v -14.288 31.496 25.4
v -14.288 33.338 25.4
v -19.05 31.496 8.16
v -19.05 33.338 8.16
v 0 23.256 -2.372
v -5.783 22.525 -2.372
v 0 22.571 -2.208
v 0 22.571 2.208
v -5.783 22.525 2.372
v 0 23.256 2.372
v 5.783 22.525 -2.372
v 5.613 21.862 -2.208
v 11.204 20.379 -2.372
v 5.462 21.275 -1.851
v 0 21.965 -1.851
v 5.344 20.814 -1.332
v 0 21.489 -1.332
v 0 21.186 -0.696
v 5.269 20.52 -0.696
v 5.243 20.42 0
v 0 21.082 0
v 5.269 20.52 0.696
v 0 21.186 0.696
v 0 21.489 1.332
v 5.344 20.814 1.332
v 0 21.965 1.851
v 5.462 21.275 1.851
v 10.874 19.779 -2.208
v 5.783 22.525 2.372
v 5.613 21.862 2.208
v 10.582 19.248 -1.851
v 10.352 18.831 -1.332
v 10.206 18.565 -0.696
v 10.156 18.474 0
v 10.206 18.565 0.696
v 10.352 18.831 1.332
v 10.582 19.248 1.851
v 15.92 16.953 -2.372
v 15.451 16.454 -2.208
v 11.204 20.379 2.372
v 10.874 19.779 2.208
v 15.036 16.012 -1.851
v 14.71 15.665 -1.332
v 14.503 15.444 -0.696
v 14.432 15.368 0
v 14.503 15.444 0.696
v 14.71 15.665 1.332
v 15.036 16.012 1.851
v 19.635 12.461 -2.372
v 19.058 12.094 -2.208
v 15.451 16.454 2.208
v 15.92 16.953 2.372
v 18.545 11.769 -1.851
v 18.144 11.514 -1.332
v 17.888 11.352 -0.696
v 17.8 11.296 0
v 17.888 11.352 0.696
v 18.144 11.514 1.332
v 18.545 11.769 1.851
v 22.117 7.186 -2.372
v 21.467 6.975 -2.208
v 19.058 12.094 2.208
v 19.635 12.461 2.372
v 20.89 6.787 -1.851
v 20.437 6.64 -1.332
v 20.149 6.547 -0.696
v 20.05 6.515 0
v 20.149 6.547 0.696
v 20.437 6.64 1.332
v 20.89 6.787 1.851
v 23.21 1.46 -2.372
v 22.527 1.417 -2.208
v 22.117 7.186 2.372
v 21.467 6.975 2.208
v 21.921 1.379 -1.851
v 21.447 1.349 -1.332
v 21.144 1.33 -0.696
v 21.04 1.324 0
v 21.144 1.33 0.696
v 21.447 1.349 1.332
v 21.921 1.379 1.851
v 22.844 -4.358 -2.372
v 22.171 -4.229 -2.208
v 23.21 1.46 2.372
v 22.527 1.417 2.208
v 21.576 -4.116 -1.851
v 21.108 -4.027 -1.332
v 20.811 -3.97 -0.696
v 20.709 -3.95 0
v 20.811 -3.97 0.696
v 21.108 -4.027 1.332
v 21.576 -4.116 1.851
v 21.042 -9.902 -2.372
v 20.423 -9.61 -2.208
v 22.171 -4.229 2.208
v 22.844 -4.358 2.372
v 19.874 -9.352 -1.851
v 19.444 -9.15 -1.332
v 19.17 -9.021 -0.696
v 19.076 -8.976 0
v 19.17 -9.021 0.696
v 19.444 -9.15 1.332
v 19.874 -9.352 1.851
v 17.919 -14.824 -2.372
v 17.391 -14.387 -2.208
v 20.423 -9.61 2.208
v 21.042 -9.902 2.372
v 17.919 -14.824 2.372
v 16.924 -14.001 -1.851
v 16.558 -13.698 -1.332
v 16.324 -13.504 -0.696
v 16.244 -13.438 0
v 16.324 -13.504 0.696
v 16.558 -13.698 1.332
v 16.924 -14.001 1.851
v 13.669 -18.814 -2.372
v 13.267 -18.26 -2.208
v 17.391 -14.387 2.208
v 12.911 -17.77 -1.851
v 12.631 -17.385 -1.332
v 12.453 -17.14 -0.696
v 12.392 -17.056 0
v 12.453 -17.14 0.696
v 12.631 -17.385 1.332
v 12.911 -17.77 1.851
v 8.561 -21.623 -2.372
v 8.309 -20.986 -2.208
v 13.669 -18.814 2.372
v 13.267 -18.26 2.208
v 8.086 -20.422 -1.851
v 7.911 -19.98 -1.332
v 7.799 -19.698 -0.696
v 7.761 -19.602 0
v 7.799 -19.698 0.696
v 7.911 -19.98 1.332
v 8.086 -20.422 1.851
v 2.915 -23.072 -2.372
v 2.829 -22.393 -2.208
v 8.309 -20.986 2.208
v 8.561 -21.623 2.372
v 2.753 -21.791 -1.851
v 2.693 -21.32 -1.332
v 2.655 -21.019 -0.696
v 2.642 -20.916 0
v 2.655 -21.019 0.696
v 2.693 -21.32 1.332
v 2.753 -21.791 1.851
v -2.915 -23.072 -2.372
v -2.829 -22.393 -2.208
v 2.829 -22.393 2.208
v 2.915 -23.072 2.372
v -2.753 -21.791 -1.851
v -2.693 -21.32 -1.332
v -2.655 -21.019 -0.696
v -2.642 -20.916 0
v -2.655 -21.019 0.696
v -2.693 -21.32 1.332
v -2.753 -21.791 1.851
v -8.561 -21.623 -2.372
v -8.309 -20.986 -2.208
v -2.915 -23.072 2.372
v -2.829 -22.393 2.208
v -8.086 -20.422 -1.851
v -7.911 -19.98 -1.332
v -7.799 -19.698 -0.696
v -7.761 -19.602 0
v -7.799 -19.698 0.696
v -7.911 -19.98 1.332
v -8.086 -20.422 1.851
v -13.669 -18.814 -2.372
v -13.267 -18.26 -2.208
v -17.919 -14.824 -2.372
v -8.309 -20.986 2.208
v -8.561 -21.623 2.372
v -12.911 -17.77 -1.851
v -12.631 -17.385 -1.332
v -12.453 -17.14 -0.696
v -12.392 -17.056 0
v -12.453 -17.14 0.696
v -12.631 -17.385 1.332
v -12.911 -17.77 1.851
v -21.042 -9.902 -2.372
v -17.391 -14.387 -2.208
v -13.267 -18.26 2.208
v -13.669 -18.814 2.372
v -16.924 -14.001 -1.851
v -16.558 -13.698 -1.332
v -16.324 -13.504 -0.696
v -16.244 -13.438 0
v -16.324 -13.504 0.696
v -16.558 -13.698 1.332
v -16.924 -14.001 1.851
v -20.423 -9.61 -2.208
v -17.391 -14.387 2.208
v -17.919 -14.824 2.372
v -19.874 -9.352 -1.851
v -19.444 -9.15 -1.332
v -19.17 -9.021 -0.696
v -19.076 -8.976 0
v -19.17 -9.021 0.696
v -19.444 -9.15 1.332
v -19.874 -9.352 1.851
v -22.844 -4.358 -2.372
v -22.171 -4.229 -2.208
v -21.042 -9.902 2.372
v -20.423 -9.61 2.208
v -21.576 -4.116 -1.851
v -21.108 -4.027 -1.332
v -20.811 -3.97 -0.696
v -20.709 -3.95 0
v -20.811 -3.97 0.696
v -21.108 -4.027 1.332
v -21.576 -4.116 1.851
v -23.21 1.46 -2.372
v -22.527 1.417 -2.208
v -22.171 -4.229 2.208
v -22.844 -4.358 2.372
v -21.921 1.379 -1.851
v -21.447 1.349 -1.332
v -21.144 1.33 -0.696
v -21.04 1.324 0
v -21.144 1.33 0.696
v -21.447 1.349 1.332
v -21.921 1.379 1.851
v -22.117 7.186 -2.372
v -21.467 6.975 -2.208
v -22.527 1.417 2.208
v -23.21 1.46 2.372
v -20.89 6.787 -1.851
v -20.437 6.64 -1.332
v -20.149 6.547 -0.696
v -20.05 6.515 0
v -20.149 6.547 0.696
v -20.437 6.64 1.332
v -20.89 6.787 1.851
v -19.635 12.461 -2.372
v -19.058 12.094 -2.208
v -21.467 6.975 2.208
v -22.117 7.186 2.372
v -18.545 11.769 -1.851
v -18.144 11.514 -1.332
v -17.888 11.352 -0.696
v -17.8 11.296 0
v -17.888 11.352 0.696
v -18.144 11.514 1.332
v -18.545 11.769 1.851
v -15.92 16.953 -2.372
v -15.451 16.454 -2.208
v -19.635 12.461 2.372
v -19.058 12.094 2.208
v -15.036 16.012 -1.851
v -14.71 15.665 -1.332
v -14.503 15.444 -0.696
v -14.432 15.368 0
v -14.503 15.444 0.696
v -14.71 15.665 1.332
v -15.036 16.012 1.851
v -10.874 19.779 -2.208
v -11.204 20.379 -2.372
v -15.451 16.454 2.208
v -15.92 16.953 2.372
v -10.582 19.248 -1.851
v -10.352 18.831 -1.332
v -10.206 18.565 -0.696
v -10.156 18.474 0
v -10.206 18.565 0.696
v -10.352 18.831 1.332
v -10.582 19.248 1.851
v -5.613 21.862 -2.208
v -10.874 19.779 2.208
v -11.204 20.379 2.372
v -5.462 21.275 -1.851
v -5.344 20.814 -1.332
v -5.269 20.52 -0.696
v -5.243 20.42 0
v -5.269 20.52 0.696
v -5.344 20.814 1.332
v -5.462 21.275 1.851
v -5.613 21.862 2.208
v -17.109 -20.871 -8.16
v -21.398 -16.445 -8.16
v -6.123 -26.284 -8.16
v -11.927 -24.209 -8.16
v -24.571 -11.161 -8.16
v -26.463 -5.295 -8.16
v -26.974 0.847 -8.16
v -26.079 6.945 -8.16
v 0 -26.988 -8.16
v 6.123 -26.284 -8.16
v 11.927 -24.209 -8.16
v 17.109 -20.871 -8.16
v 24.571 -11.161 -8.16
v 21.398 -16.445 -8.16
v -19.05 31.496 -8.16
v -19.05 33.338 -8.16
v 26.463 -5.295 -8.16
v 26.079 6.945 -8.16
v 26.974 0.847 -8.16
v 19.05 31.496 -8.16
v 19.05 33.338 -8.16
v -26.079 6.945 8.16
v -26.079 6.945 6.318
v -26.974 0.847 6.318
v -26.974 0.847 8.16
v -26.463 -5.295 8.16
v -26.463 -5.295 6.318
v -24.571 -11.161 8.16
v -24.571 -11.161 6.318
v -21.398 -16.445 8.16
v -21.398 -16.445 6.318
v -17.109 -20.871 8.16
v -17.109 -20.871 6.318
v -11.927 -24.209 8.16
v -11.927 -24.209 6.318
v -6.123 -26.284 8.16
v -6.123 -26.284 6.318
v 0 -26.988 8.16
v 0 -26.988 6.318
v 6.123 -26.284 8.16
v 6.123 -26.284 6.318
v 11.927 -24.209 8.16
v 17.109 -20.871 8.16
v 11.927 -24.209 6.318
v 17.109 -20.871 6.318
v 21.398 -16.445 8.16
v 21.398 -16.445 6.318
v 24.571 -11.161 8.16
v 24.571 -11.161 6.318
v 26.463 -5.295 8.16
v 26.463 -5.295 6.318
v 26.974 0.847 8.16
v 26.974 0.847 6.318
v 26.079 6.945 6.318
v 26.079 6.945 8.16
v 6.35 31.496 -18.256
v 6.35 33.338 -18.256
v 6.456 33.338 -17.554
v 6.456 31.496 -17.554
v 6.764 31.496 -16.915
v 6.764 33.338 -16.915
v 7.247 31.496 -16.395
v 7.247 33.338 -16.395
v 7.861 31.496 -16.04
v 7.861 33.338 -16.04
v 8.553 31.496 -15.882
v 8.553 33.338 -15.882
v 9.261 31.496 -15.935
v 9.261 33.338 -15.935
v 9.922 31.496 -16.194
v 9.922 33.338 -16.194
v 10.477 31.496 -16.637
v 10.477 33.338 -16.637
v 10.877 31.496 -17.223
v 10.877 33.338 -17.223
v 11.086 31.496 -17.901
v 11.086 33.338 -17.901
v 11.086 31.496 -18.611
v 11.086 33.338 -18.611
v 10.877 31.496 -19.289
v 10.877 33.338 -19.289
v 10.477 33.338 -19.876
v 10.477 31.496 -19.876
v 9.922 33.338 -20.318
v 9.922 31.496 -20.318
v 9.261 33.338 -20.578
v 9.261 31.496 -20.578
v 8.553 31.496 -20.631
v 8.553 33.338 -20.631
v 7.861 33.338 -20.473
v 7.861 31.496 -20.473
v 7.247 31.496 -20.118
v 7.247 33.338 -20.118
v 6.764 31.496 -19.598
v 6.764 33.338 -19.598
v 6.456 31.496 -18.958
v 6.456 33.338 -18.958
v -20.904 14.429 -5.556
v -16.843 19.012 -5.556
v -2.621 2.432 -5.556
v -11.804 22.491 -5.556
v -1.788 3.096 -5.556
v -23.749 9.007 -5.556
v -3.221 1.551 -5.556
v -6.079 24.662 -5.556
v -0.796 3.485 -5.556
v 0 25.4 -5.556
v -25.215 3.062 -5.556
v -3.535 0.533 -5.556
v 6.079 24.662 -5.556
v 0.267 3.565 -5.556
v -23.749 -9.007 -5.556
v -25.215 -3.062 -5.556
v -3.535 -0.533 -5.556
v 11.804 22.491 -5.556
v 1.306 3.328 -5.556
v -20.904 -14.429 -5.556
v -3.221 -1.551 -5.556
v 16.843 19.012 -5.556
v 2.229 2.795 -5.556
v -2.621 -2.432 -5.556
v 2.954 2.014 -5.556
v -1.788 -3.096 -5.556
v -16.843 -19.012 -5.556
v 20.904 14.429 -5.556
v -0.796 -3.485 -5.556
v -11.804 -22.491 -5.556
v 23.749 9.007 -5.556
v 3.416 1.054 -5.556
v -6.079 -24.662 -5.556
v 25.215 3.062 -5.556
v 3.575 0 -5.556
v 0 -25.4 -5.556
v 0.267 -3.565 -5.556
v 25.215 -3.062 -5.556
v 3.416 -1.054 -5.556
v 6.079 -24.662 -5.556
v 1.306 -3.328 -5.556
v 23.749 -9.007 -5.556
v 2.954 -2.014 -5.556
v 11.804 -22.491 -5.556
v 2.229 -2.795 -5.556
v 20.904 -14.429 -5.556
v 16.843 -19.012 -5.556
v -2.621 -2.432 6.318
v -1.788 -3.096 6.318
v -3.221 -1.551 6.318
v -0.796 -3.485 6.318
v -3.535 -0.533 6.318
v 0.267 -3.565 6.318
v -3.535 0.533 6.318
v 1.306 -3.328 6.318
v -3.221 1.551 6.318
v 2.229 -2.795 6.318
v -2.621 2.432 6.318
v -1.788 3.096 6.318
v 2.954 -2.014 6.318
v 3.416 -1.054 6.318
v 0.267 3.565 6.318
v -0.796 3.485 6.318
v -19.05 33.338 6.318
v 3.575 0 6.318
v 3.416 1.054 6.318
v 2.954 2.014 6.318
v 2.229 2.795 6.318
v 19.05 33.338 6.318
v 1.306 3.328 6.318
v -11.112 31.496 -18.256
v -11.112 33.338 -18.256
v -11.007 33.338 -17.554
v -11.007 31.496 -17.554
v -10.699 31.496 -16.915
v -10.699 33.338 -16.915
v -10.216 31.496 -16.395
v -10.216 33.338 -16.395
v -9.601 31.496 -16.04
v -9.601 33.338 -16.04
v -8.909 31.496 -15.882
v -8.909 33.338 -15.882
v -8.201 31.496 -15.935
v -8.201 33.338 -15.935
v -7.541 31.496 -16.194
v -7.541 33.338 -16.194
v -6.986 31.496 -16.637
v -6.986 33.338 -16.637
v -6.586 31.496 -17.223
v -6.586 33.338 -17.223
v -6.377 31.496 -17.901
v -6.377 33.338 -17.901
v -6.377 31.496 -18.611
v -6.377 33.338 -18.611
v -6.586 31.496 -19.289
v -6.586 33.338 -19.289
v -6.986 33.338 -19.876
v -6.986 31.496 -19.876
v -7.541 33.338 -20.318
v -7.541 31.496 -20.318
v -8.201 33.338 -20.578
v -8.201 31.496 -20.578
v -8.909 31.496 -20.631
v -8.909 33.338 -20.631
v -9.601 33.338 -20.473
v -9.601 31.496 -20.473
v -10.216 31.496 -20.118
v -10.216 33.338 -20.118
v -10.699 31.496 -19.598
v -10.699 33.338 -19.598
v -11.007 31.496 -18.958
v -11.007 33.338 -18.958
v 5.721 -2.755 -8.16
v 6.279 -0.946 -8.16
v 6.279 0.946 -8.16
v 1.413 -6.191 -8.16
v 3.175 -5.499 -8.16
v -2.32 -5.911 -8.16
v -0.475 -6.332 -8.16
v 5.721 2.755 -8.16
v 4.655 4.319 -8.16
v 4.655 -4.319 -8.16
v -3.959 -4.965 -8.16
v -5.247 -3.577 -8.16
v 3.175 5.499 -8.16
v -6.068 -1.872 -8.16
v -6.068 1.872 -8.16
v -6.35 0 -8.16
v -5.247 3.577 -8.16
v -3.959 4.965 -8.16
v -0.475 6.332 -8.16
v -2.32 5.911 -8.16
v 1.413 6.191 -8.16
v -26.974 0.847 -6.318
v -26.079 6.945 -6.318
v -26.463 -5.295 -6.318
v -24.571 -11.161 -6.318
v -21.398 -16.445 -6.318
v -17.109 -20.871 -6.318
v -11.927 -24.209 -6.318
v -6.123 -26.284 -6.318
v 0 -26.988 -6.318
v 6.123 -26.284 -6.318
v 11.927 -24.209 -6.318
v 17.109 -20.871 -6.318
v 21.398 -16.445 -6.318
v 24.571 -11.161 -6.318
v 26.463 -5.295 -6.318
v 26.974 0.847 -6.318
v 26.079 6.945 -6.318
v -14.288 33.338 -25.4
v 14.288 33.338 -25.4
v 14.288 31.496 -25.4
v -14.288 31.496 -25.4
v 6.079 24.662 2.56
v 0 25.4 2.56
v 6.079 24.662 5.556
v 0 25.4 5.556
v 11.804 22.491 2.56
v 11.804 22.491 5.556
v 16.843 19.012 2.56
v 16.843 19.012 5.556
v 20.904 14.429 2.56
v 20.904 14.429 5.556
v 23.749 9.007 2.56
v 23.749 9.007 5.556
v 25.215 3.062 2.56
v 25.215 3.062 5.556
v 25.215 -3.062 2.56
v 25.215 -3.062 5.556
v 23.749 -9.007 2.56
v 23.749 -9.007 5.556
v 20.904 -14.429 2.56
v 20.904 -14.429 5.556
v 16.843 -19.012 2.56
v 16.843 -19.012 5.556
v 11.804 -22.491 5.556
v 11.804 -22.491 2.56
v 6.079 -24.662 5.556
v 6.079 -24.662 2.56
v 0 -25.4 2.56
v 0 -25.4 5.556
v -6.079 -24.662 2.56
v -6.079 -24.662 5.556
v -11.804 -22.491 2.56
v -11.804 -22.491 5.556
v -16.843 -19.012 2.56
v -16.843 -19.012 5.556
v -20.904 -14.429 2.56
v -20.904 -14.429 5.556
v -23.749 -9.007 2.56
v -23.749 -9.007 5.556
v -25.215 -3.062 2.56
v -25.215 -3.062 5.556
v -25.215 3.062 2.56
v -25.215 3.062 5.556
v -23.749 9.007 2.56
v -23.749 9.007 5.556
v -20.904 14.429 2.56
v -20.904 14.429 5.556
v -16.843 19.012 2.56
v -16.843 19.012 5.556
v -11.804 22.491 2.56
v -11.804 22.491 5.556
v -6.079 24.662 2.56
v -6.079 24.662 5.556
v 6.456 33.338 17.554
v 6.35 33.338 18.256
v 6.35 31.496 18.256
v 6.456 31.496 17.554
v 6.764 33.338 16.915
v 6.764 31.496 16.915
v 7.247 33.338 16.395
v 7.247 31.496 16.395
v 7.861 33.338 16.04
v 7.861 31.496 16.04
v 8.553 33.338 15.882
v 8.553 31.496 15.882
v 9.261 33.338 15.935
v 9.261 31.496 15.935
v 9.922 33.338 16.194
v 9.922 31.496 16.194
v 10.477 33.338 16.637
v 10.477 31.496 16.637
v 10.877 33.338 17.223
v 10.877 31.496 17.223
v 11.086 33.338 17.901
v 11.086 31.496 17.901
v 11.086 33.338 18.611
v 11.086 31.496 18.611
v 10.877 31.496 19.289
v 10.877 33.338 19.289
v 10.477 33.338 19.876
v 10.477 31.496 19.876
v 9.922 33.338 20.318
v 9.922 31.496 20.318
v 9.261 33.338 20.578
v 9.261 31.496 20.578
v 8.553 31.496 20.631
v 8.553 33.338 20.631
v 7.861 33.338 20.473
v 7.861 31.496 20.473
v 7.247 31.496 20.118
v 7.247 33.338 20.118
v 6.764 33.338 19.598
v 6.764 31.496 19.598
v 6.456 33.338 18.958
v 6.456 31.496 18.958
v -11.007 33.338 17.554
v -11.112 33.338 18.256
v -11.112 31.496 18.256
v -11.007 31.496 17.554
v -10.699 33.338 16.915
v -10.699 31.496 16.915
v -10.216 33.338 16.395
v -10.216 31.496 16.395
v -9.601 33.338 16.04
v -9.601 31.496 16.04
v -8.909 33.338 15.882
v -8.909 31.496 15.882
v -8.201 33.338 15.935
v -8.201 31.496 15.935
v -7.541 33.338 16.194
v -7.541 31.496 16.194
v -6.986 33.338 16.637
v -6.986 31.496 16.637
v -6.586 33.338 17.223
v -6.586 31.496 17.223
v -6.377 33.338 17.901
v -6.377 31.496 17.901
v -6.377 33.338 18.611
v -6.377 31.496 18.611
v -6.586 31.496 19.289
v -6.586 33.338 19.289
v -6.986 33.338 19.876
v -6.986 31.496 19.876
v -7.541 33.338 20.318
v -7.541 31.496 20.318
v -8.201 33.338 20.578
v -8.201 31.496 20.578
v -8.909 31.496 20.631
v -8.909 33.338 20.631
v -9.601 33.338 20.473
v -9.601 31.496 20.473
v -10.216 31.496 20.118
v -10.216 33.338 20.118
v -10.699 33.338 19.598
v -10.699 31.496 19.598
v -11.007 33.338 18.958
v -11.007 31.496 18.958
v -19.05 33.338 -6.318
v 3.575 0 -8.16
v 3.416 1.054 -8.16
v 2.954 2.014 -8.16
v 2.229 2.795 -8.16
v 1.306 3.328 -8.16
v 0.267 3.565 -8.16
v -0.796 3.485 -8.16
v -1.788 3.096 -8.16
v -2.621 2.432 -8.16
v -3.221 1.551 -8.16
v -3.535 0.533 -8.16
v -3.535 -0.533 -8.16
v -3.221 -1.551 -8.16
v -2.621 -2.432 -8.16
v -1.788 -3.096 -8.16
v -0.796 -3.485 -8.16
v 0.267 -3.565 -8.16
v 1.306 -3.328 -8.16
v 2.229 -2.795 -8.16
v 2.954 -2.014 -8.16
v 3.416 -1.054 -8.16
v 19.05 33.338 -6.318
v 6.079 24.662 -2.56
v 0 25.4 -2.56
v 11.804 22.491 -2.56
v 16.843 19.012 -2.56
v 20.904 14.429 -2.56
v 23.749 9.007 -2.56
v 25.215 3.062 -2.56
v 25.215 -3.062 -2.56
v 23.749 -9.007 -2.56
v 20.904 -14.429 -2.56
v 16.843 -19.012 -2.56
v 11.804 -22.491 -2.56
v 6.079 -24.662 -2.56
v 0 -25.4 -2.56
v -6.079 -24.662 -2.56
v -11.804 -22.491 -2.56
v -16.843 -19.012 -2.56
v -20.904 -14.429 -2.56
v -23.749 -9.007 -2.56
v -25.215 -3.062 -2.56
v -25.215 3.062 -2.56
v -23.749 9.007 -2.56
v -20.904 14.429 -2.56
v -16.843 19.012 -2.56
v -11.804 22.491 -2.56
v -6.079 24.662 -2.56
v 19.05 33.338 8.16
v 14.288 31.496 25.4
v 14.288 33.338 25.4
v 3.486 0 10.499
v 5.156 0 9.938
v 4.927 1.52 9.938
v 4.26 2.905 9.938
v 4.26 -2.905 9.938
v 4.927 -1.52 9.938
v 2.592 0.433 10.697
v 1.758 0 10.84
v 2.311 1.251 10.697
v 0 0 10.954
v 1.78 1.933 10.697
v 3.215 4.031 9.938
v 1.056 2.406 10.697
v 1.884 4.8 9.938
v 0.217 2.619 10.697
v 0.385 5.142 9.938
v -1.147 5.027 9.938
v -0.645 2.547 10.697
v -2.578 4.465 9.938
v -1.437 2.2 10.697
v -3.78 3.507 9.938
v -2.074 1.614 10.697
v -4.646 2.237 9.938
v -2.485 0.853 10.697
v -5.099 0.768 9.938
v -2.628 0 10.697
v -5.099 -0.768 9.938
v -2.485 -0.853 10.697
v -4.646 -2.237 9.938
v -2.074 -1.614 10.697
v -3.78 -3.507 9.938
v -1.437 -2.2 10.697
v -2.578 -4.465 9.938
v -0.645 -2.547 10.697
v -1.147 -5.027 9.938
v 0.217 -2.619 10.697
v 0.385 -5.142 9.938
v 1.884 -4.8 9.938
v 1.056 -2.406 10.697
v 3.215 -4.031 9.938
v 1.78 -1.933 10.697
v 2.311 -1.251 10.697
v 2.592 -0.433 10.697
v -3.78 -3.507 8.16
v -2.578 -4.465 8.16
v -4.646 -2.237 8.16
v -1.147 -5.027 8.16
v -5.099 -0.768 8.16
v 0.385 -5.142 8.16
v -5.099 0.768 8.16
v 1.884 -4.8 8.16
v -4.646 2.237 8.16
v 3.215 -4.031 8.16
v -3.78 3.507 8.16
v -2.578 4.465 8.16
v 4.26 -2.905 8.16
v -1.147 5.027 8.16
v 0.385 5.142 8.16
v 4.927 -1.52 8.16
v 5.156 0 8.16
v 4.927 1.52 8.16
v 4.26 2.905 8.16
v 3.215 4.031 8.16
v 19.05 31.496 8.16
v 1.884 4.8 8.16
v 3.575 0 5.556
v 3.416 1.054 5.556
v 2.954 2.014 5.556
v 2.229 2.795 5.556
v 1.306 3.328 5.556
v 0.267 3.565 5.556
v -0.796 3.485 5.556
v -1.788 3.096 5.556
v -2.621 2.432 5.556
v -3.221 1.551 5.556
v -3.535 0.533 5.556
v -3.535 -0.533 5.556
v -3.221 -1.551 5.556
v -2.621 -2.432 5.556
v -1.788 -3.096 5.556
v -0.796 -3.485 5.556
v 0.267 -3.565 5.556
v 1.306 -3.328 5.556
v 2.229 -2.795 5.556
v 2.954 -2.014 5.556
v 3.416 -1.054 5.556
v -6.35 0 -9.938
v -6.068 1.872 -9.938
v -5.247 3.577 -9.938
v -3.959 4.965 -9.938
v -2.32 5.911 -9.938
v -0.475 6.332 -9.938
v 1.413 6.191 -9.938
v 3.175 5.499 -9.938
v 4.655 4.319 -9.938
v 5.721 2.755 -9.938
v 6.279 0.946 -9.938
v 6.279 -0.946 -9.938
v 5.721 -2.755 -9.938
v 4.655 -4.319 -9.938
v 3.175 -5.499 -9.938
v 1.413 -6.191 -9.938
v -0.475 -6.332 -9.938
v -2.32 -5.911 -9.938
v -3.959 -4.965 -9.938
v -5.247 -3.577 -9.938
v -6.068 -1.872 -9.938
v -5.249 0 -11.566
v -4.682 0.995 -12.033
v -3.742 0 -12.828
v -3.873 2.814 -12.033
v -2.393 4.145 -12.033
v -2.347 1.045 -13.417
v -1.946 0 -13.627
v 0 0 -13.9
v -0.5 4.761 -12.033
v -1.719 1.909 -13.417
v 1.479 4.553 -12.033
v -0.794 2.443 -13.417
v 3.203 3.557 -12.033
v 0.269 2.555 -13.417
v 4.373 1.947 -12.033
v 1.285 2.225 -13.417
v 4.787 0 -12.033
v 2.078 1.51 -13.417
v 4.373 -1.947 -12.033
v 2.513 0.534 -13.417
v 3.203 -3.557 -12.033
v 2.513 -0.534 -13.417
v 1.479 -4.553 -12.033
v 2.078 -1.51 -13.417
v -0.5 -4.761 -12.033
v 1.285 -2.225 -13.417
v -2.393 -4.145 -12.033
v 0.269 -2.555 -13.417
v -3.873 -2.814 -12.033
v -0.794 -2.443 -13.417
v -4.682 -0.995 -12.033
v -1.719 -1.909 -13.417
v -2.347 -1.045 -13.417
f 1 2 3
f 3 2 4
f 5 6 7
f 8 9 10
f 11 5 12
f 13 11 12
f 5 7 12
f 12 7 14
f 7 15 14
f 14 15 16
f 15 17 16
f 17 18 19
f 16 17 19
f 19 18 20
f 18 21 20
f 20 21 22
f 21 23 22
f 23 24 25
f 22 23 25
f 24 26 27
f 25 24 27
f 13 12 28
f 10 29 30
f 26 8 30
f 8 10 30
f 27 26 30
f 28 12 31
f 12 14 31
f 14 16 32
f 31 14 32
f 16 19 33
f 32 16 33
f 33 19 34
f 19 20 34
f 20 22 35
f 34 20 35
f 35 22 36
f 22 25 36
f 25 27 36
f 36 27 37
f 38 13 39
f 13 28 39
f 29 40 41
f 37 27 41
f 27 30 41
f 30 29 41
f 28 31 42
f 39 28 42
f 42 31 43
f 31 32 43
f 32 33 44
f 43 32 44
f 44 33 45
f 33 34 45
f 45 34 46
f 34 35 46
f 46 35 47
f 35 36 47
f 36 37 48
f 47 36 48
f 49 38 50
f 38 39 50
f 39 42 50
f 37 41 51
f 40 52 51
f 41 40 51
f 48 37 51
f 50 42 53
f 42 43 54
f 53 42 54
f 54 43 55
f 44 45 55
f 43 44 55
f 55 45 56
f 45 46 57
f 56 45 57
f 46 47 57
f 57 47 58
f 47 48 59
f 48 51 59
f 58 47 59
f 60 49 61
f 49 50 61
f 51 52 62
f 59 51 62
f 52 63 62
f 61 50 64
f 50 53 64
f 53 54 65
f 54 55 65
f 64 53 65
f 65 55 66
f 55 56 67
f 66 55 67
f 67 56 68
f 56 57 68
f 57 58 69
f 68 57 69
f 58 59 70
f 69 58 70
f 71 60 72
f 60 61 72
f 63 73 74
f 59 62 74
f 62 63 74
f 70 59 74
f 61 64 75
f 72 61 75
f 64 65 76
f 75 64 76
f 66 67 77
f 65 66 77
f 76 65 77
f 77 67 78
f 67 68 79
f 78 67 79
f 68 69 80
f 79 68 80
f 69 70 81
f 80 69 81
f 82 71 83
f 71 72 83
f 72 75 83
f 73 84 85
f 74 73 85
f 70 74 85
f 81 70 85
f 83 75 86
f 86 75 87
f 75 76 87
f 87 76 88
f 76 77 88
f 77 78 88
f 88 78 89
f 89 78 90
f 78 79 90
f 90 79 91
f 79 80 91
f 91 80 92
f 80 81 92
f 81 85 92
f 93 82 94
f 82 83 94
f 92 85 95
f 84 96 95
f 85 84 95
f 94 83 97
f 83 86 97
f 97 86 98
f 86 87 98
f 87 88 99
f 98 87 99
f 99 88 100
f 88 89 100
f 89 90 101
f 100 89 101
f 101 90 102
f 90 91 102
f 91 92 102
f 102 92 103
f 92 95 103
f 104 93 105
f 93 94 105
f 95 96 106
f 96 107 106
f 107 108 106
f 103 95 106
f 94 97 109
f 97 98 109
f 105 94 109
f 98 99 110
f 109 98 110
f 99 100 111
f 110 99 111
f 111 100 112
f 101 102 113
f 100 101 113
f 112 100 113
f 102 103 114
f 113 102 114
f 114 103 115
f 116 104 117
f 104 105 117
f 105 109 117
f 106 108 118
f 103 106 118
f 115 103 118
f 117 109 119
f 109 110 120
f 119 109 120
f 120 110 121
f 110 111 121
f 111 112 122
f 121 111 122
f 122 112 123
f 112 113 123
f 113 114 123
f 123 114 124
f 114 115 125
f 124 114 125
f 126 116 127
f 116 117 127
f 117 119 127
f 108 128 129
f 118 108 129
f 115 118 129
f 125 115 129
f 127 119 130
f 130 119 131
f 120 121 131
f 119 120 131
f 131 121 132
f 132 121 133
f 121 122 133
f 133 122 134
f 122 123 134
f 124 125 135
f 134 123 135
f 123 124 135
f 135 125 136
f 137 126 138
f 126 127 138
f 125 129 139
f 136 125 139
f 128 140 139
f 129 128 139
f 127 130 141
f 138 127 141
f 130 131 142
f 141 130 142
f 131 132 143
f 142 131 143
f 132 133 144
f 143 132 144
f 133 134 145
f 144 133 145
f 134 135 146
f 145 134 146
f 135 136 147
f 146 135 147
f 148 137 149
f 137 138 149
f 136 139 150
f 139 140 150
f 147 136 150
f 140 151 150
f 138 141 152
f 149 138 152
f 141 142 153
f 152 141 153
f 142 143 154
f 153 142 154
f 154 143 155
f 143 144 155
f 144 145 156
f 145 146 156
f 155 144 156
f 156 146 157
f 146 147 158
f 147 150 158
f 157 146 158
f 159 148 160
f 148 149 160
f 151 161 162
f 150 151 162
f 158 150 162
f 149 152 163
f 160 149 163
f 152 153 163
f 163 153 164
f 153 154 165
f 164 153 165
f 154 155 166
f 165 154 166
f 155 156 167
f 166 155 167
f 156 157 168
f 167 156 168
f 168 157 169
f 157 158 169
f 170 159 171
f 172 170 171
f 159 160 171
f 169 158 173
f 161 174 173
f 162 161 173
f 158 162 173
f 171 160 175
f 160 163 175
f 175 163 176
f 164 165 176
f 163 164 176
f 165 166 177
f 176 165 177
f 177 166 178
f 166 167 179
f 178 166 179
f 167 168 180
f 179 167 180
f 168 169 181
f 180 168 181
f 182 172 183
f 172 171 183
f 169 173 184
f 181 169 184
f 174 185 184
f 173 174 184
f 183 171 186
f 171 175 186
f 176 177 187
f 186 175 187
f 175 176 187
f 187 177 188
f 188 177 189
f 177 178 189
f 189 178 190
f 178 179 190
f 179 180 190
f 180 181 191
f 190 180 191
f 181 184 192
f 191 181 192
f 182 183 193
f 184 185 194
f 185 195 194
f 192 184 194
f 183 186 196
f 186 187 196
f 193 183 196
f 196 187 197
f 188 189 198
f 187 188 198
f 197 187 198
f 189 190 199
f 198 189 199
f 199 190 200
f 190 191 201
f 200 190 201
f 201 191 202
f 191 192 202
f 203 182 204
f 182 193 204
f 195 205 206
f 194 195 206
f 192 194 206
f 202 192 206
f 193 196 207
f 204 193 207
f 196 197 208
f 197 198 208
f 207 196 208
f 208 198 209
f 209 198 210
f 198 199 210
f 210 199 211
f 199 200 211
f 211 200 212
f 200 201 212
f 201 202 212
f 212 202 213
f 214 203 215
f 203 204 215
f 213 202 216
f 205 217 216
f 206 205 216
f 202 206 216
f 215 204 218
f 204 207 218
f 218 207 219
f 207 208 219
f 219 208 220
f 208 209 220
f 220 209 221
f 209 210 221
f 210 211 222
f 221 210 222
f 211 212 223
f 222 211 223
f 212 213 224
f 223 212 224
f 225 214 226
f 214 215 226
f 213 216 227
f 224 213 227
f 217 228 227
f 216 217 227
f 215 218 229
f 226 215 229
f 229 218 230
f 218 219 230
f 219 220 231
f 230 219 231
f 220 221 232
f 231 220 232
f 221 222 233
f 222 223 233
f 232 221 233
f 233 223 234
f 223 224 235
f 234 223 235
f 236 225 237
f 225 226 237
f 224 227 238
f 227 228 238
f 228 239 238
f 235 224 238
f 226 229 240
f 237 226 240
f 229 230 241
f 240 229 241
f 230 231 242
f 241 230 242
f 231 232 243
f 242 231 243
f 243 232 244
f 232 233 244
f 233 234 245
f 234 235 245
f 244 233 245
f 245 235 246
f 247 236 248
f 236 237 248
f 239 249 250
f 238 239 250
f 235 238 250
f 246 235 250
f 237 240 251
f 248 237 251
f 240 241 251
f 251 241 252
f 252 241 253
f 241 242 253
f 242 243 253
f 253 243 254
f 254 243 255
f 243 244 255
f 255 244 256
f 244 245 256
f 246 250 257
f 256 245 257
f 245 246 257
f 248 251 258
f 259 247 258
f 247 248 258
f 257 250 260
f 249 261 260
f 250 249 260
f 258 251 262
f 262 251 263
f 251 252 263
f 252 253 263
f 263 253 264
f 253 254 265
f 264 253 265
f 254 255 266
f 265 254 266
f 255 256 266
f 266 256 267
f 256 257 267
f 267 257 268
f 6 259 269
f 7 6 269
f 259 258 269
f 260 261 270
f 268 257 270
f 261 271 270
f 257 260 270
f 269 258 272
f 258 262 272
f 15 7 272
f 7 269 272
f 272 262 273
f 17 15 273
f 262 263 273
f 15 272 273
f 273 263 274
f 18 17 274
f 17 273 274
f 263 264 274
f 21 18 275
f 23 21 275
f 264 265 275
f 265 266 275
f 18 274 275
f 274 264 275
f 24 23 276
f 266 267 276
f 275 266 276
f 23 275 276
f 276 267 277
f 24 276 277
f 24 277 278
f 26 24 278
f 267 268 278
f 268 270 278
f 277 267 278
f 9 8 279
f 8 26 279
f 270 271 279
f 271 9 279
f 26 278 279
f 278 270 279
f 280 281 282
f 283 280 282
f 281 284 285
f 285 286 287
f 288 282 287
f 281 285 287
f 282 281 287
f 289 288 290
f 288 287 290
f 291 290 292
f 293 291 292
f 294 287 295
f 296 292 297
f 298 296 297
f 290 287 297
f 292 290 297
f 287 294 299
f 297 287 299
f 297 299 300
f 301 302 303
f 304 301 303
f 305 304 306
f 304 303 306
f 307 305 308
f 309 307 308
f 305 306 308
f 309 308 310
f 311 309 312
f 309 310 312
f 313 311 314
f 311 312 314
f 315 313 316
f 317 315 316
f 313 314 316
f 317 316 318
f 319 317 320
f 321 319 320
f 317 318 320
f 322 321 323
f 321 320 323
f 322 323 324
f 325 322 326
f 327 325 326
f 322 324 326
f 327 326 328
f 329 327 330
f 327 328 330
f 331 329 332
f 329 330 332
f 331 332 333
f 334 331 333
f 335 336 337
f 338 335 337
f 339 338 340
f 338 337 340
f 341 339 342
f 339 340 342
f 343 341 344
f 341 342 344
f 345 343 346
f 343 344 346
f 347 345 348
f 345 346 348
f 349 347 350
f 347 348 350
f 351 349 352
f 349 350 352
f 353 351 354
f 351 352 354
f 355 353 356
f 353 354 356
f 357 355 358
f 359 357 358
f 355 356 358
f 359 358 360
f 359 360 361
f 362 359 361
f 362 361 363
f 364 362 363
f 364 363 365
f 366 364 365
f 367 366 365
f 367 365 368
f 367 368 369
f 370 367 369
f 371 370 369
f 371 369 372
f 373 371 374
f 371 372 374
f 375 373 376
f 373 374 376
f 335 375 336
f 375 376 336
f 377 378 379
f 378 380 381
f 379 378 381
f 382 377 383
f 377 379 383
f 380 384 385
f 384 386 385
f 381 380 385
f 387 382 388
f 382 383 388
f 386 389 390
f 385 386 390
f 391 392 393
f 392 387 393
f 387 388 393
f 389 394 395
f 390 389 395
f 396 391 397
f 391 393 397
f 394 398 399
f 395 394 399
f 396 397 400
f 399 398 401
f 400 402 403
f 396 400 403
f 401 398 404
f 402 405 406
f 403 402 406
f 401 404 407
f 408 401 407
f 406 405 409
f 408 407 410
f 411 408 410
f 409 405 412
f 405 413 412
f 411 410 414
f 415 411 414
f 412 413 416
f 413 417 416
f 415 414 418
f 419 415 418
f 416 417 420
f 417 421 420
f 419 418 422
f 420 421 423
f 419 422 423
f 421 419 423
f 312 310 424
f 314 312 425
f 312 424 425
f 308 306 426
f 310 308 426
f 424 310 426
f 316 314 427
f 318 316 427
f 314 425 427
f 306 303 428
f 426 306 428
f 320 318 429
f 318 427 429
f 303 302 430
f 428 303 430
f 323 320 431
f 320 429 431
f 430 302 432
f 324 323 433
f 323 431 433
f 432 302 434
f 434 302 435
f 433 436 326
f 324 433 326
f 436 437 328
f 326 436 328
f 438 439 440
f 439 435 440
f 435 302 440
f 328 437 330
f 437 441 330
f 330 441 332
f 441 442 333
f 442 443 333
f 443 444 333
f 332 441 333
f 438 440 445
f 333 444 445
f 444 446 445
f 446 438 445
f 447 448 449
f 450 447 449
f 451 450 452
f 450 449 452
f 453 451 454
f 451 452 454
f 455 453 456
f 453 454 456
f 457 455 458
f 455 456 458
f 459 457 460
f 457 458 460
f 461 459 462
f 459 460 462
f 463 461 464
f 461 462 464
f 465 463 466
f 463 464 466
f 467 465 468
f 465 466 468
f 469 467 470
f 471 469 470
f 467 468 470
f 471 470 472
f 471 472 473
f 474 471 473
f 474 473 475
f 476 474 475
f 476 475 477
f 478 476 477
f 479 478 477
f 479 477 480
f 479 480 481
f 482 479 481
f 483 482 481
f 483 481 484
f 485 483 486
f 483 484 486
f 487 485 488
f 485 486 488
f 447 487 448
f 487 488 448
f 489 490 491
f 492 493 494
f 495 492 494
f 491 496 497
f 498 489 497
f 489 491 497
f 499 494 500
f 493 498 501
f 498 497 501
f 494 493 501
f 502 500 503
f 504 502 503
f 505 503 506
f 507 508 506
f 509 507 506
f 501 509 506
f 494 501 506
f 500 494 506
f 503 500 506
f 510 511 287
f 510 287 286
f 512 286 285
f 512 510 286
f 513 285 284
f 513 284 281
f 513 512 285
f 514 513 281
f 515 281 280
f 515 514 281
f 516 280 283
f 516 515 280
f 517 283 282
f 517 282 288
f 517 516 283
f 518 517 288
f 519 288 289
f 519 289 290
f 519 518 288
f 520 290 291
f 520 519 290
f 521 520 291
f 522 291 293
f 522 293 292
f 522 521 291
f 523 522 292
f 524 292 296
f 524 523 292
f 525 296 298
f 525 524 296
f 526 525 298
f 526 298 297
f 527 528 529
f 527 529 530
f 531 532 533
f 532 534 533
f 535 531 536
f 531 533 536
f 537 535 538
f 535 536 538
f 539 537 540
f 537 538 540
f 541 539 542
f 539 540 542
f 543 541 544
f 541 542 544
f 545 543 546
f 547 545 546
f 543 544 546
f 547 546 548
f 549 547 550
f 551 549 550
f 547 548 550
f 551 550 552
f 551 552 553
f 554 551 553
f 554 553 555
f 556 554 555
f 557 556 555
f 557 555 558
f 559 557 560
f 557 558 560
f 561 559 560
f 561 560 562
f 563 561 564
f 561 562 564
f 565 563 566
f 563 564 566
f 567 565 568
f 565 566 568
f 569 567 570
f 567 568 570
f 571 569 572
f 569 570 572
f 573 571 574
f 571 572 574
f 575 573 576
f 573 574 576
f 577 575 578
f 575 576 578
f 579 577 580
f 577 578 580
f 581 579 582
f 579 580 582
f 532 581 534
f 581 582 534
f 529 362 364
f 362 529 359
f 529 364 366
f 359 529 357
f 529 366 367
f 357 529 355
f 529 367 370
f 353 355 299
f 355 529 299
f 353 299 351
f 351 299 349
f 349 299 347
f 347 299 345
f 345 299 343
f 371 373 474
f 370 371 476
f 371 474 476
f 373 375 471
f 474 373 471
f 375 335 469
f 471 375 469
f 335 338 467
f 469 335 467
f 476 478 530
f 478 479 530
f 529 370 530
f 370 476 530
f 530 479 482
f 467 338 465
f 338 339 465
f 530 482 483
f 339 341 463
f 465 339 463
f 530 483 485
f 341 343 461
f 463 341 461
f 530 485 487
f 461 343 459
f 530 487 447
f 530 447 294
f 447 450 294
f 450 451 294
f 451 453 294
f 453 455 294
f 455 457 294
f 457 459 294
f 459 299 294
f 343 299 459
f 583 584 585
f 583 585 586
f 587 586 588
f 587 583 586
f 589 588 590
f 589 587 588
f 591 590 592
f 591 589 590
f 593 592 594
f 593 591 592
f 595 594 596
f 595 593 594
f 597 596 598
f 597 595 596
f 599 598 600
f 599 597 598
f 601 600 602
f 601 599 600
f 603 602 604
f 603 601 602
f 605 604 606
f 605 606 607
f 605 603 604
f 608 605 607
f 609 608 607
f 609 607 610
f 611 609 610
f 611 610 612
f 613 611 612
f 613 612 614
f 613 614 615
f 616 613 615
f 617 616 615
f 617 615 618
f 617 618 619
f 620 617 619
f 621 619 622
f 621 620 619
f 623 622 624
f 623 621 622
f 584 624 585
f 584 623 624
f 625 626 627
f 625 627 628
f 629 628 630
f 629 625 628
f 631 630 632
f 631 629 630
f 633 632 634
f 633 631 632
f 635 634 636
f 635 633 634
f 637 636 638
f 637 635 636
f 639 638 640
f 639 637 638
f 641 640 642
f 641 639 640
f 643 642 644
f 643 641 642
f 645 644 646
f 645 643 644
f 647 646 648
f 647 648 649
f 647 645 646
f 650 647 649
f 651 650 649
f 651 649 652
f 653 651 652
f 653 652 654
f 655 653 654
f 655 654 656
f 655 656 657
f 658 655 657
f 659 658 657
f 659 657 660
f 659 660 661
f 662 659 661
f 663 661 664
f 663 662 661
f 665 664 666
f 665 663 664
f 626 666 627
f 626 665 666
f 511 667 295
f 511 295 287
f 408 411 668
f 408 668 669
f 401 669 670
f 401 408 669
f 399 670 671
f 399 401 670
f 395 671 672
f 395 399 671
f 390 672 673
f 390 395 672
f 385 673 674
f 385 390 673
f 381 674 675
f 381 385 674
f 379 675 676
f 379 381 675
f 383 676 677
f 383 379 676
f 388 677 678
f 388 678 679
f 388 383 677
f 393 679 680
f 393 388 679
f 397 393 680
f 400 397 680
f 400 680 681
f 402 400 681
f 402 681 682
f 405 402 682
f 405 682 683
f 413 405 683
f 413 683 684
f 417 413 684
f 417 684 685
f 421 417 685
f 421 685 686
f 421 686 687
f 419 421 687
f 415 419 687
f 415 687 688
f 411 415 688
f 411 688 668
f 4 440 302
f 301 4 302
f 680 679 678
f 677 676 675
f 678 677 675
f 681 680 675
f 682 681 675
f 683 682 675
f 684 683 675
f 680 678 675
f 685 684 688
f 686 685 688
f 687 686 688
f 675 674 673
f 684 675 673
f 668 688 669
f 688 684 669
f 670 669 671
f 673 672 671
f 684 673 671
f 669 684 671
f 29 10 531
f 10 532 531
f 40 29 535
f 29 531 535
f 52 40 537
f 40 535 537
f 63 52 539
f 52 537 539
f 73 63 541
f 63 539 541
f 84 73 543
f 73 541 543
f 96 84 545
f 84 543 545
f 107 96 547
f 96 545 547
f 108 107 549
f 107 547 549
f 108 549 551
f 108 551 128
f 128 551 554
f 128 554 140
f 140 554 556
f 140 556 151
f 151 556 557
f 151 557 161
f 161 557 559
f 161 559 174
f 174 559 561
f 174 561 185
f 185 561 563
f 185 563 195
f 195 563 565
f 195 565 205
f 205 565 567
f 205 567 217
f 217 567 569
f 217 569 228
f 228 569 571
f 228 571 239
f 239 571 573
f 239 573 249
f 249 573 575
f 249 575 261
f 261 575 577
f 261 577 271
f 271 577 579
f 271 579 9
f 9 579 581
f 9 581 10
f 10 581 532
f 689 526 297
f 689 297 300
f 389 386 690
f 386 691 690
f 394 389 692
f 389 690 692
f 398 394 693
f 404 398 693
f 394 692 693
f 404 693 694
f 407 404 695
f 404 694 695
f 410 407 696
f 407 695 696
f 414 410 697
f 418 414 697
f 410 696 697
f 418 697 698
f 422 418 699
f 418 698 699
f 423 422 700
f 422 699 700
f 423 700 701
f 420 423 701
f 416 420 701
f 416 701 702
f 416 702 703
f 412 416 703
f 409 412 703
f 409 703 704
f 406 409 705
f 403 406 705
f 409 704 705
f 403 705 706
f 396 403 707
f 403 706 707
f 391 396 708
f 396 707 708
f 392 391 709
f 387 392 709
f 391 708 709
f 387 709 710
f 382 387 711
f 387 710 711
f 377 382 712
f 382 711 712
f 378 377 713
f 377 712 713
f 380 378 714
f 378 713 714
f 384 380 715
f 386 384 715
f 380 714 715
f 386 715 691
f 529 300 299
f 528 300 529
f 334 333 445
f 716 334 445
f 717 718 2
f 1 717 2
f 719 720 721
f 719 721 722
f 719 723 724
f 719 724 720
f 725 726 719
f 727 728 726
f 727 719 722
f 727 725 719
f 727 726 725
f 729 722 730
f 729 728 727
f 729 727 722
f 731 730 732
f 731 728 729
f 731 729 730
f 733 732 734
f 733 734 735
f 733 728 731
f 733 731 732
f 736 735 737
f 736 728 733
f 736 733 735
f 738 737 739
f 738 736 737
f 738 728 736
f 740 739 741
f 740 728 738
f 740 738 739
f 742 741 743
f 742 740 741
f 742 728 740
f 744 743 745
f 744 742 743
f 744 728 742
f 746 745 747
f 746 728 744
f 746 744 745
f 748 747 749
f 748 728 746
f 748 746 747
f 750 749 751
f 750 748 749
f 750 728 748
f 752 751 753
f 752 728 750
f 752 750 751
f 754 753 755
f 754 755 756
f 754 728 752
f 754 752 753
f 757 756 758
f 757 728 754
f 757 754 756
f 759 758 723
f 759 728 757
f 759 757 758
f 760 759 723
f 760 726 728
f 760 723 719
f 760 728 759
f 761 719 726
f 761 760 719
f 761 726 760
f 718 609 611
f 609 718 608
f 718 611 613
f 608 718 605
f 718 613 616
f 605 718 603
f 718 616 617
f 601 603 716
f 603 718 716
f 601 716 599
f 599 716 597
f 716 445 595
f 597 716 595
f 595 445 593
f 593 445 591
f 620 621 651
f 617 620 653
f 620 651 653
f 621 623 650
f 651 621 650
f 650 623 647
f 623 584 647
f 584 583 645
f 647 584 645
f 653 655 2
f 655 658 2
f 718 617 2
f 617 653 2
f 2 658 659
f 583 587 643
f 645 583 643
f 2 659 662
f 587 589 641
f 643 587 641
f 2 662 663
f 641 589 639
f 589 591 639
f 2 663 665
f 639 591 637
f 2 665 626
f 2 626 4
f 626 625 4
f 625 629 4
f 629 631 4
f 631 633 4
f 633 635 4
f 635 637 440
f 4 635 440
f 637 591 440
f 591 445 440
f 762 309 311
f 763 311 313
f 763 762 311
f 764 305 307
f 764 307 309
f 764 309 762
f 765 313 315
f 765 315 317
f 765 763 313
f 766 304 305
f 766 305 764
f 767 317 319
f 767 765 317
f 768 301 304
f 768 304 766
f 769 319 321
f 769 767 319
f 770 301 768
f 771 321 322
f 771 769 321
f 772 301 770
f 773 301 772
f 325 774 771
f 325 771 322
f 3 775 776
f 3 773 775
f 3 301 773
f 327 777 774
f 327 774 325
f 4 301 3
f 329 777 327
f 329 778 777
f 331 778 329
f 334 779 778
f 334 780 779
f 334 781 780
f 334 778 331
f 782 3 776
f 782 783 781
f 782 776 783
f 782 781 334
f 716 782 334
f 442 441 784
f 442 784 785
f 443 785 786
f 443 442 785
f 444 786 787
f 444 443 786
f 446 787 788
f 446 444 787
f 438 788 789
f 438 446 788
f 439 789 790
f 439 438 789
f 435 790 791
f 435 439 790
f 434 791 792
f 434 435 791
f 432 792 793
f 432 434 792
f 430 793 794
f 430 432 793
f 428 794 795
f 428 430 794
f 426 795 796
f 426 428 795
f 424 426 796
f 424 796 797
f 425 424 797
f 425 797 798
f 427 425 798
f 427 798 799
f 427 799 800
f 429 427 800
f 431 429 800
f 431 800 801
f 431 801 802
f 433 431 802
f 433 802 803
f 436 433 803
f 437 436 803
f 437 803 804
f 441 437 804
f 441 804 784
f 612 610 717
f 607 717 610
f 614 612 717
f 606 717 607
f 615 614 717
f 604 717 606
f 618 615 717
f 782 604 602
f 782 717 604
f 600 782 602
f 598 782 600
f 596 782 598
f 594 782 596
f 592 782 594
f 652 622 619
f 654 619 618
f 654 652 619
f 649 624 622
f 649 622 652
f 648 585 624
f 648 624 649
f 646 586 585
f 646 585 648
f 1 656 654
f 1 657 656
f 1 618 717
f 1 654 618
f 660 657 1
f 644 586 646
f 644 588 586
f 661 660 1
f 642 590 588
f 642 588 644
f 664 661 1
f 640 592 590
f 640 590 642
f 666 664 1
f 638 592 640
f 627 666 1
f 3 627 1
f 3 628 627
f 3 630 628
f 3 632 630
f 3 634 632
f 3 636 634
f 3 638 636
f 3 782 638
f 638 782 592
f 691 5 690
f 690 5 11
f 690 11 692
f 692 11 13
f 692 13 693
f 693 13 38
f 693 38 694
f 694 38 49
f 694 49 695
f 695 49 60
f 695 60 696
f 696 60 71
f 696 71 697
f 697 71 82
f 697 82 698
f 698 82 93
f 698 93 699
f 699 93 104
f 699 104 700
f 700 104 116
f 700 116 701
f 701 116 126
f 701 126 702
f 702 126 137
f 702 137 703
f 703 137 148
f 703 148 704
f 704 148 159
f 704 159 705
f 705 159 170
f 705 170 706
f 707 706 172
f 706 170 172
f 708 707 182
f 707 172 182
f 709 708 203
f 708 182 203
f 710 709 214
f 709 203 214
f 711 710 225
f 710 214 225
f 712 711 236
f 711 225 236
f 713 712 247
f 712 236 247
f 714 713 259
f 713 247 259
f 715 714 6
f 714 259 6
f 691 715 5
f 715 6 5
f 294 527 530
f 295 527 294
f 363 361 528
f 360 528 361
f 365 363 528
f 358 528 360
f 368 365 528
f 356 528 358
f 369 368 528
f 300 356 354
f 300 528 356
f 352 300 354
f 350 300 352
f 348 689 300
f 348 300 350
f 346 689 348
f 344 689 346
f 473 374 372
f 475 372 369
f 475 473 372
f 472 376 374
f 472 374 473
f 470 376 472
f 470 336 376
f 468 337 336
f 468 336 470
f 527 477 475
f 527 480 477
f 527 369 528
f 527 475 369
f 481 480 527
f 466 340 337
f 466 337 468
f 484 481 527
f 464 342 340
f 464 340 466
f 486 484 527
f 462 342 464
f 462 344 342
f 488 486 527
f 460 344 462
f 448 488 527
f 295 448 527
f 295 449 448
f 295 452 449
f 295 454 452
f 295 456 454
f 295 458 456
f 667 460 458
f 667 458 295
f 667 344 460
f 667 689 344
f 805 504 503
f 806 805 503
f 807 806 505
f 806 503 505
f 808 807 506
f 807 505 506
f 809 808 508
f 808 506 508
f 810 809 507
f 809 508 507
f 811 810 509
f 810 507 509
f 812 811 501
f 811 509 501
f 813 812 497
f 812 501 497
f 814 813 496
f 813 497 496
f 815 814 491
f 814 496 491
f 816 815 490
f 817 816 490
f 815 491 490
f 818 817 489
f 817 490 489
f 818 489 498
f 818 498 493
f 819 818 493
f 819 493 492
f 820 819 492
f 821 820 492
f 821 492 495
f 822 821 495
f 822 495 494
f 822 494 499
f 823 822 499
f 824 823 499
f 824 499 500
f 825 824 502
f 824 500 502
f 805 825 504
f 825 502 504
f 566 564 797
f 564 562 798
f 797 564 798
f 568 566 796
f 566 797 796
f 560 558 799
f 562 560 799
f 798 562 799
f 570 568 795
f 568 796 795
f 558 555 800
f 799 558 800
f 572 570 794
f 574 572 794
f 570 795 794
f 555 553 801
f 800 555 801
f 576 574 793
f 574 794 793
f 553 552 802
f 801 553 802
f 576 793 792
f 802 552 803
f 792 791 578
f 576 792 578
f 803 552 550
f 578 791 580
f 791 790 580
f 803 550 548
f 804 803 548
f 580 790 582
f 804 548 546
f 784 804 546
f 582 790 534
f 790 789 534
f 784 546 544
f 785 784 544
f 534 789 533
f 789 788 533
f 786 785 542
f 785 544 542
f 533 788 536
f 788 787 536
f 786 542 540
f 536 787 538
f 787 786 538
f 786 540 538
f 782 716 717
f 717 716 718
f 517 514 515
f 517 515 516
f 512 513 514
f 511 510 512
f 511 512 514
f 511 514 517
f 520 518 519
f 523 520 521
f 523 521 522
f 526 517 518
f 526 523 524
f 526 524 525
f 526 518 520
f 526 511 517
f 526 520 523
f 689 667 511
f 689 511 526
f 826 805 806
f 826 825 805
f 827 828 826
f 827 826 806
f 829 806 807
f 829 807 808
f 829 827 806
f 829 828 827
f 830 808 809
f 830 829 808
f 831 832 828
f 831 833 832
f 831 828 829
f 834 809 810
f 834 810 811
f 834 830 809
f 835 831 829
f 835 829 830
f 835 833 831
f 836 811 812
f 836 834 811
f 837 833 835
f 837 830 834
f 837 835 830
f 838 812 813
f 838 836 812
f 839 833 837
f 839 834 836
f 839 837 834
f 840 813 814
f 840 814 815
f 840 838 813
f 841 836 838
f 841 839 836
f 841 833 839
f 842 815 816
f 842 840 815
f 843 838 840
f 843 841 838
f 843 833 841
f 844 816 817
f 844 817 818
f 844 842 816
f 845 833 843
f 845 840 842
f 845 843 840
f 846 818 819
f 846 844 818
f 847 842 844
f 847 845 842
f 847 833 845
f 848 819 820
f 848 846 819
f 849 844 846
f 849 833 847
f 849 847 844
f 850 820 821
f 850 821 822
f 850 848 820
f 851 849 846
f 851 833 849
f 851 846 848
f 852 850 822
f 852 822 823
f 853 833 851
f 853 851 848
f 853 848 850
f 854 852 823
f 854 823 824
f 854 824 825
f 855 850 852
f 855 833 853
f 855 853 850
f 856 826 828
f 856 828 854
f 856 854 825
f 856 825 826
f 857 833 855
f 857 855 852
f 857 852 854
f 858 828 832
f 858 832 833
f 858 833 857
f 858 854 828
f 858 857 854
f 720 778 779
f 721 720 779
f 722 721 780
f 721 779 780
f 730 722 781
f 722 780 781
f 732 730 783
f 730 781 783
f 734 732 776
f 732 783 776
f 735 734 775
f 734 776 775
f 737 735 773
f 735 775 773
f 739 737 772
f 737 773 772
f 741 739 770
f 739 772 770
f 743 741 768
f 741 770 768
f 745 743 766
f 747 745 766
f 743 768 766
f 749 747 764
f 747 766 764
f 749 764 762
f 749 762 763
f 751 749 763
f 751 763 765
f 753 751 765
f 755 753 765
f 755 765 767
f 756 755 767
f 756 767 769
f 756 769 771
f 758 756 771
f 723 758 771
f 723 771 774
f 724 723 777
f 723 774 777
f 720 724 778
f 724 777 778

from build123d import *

# Parameters (mm, degrees)
BOSS_EXTRUDE1_DEPTH = 1.8415
SKETCH5_R           = 2.38125
BOSS_EXTRUDE2_DEPTH = 1.8415
SKETCH6_R           = 5.1562
BOSS_EXTRUDE3_DEPTH = 1.778
DOME4_FACE_RADIUS   = 5.1562
DOME4_HEIGHT        = 1.016
SKETCH8_R           = 6.35
BOSS_EXTRUDE4_DEPTH = 1.778
DOME7_FACE_RADIUS   = 6.35
DOME7_HEIGHT        = 3.9624
SKETCH9_R           = 3.57505
BOSS_EXTRUDE5_DEPTH = 16.3195


with BuildPart() as part:
    # Sketch3 → Revolve1 (revolve)
    with BuildSketch(Plane(origin=(0, 0, 0), x_dir=(0, 0, -1), z_dir=(1, 0, 0))):
        with BuildLine():
            Line((-5.55625, 25.4), (-5.55625, 0))
            Line((-5.55625, 0), (5.55625, 0))
            Line((5.55625, 0), (5.55625, 25.4))
            Line((5.55625, 25.4), (2.559789657, 25.4))
            Line((2.559789657, 25.4), (2.372188625, 23.255710388))
            ThreePointArc((2.372188625, 23.255710388), (0, 21.082), (-2.372188625, 23.255710388))
            Line((-2.372188625, 23.255710388), (-2.559789657, 25.4))
            Line((-2.559789657, 25.4), (-5.55625, 25.4))
        make_face()
    revolve(axis=Axis((0, 0, 5.55625), (0, 0, -1)))



with BuildPart() as body_2:
    # Sketch4 → Boss-Extrude1 (new body)
    with BuildSketch(Plane.XY.offset(6.31825)):
        with BuildLine():
            Line((19.05, 33.3375), (-19.05, 33.3375))
            Line((-19.05, 33.3375), (-26.078582277, 6.944976794))
            ThreePointArc((-26.078582277, 6.944976794), (0, -26.9875), (26.078582277, 6.944976794))
            Line((26.078582277, 6.944976794), (19.05, 33.3375))
        make_face()
    extrude(amount=BOSS_EXTRUDE1_DEPTH)

    # Sketch5 → Boss-Extrude2 (add)
    with BuildSketch(Plane(origin=(0, 33.3375, 97.5995), x_dir=(-1, 0, 0), z_dir=(0, -1, 0))):
        Polygon((-14.2875, 72.1995), (14.2875, 72.1995), (19.05, 89.43975), (-19.05, 89.43975), align=None)
        with Locations((-8.73125, 79.34325)):
            Circle(SKETCH5_R, mode=Mode.SUBTRACT)
        with Locations((8.73125, 79.34325)):
            Circle(SKETCH5_R, mode=Mode.SUBTRACT)
    extrude(amount=BOSS_EXTRUDE2_DEPTH)


with BuildPart() as body_3:
    # Mirror1: mirrored copy
    add(body_2.part.mirror(Plane.XY))


with BuildPart() as body_2_1:
    add(body_2.part)

    # Sketch6 → Boss-Extrude3 (add)
    with BuildSketch(Plane.XY.offset(8.15975)):
        Circle(SKETCH6_R)
    extrude(amount=BOSS_EXTRUDE3_DEPTH)

    # Dome4: a dome of height H over a round flat face of radius A is a cap of a sphere of radius (A * A + H * H) / (2 * H)
    dome4_r = (DOME4_FACE_RADIUS * DOME4_FACE_RADIUS + DOME4_HEIGHT * DOME4_HEIGHT) / (2 * DOME4_HEIGHT)
    dome4_base = Plane((0, 0, 9.93775), z_dir=(0, 0, 1))
    with Locations(dome4_base.offset(DOME4_HEIGHT - dome4_r)):
        dome4_ball = Sphere(dome4_r, mode=Mode.PRIVATE)
    add(split(dome4_ball, bisect_by=dome4_base, keep=Keep.TOP, mode=Mode.PRIVATE))


with BuildPart() as body_4:
    # Sketch8 → Boss-Extrude4 (new body)
    with BuildSketch(Plane(origin=(0, 0, -8.15975), x_dir=(-1, 0, 0), z_dir=(0, 0, -1))):
        Circle(SKETCH8_R)
    extrude(amount=BOSS_EXTRUDE4_DEPTH)

    # Dome7: a dome of height H over a round flat face of radius A is a cap of a sphere of radius (A * A + H * H) / (2 * H)
    dome7_r = (DOME7_FACE_RADIUS * DOME7_FACE_RADIUS + DOME7_HEIGHT * DOME7_HEIGHT) / (2 * DOME7_HEIGHT)
    dome7_base = Plane((0, 0, -9.93775), z_dir=(0, 0, -1))
    with Locations(dome7_base.offset(DOME7_HEIGHT - dome7_r)):
        dome7_ball = Sphere(dome7_r, mode=Mode.PRIVATE)
    add(split(dome7_ball, bisect_by=dome7_base, keep=Keep.TOP, mode=Mode.PRIVATE))


with BuildPart() as part_1:
    add(part.part)

    add(body_2_1.part)  # Boss-Extrude5 merges body 2
    # Sketch9 → Boss-Extrude5 (add)
    with BuildSketch(Plane.XY.offset(8.15975)):
        Circle(SKETCH9_R)
    extrude(amount=-BOSS_EXTRUDE5_DEPTH)


solid = Compound([body_3.part, body_4.part, part_1.part])
